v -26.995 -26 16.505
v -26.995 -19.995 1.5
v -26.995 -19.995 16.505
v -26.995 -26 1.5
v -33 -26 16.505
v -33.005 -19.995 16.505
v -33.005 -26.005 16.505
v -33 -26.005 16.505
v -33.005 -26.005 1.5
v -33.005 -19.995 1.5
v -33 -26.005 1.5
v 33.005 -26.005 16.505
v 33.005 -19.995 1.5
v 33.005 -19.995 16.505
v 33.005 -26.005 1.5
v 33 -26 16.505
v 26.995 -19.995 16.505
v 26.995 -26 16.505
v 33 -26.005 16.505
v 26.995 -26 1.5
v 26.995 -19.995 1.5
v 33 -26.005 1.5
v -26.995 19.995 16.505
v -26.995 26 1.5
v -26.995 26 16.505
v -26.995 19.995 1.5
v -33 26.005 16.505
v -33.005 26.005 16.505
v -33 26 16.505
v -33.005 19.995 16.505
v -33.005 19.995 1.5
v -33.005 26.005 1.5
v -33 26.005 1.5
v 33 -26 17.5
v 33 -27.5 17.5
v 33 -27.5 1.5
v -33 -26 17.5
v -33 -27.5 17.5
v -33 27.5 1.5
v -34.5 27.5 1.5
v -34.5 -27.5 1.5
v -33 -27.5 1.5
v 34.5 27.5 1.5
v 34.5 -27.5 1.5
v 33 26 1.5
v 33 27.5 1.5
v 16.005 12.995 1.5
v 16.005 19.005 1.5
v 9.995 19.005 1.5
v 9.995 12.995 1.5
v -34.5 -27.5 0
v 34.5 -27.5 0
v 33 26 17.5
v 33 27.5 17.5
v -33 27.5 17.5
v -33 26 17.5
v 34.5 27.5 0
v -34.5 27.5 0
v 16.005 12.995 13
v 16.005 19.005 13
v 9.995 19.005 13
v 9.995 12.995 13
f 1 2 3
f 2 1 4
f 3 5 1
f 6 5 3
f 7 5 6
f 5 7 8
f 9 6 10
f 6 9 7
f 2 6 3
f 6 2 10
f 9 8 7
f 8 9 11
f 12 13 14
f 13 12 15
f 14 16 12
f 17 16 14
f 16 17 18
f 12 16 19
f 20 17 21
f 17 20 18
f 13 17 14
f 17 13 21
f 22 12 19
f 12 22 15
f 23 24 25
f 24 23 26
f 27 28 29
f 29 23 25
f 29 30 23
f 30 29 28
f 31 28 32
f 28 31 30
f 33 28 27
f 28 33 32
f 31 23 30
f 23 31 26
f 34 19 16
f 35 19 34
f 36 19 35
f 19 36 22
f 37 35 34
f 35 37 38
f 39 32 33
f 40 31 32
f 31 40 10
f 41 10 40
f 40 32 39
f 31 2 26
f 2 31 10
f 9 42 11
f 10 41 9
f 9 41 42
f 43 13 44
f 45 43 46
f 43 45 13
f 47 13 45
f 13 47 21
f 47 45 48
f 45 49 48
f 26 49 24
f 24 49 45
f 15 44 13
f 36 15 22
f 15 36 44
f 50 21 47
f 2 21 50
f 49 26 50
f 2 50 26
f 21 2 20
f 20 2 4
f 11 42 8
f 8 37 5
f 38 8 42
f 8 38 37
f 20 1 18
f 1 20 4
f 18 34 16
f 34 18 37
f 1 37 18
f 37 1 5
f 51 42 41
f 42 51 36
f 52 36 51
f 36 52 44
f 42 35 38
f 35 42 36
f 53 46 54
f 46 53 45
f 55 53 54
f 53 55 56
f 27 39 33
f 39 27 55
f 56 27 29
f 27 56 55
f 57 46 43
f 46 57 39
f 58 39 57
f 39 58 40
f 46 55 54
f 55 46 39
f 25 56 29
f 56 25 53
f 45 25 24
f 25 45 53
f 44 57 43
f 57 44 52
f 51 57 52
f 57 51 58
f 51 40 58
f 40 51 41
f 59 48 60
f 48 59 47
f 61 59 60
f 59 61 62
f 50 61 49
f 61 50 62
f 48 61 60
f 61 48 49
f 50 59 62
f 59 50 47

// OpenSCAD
// Basic encosulre for the bike computer. Specail made
// For a quick n'dirty assembly of a blue-pill STM32 MCU
// with 2 buttons and a 1.3 inch display. Totally non-standard.
// 
// It is made of two parts. Comment out each one to print the other.


eps = 0.01;
wall_width = 1.5;

pcb_w = 66;
pcb_h = 52;
pcb_d = 1.5;

width = pcb_w + 2*wall_width;
height = pcb_h + 2*wall_width;

// Screen related measurements.
scr_w = 36;
scr_h = 20;

scr_to_pcb_h = 7;
scr_offs_x = 0;
scr_offs_y = (pcb_h - scr_h) / 2 - scr_to_pcb_h;

// Buttons.
button_d = 13;
bt_to_pcb_h = 11;

bt_offs_x = 24;
bt_offs_y = pcb_h / 2 - bt_to_pcb_h;

// Support height.
supp_h = 9;
supp_w = 8;

// Height for the backside.
back_d = 15;

// Top part
/*
union() {
translate([0,0, wall_width/2]) 
difference() {
// Base front plate.
translate([0,0,0]) cube([width, height, wall_width], center=true);
// Opening display.
translate([scr_offs_x, scr_offs_y,0]) cube([scr_w,scr_h,wall_width+eps], center = true);
// Button 1 hole.
translate([bt_offs_x, bt_offs_y,0]) cylinder(wall_width+eps, button_d/2, button_d/2, center = true, $fn=32);
// Button 2 hole.
translate([-bt_offs_x, bt_offs_y,0]) cylinder(wall_width+eps, button_d/2, button_d/2, center = true, $fn=32);
}
translate([0,0, supp_h/2+wall_width]) {
// low Support 1
translate([-(pcb_w-supp_w)/2, -(pcb_h-supp_w)/2,0]) cube([supp_w+eps, supp_w+eps, supp_h+eps], center=true);
// low Support 2
translate([(pcb_w-supp_w)/2,-(pcb_h-supp_w)/2,0]) cube([supp_w+eps, supp_w+eps, supp_h+eps], center=true);
}
translate([0,0, supp_h/2+wall_width/2]) {
// top_sidewall
translate([0,(pcb_h+wall_width)/2,0]) cube([width, wall_width, wall_width + supp_h], center=true);
// bottom_sidewall
translate([0,-(pcb_h+wall_width)/2,0]) cube([width, wall_width, wall_width + supp_h], center=true);
}
side_z = wall_width + supp_h + pcb_d + back_d;
translate([0,0, side_z / 2]) {
// left_sidewall
translate([-(pcb_w+wall_width)/2,0,0]) cube([wall_width, height, side_z], center=true);
// right_sidewall
translate([(pcb_w+wall_width)/2,0,0]) cube([wall_width, height, side_z], center=true);
}
}
*/

// Bottom part 
translate([0,0, wall_width/2]) 
union() {
//translate([0,0, wall_width/2]) 

// Base front plate.
translate([0,0,0]) cube([width, height, wall_width], center=true);

// Support ext conn
supp1_h=11.5;
supp1_w=6;
supp1_x=pcb_w/2 - 20;
supp1_y=pcb_h/2 - 10;    
translate([supp1_x, supp1_y, (
    supp1_h + wall_width)/2]) cube([supp1_w+eps, supp1_w+eps, supp1_h], center=true);

supp2_w=6;    
supp2_h=15;    
translate([0,0, supp2_h/2+wall_width/2]) {
// low Support 1
translate([-(pcb_w-supp2_w)/2, -(pcb_h-supp2_w)/2,0]) cube([supp2_w+eps, supp2_w+eps, supp2_h+eps], center=true);
// low Support 2
translate([(pcb_w-supp2_w)/2,-(pcb_h-supp2_w)/2,0]) cube([supp2_w+eps, supp2_w+eps, supp2_h+eps], center=true);
// high Support 1
translate([-(pcb_w-supp2_w)/2,(pcb_h-supp2_w)/2,0]) cube([supp2_w+eps, supp2_w+eps, supp2_h+eps], center=true);
    
}

side_z = 16;
translate([0,0, side_z / 2 + wall_width/2]) {
// up_sidewall
translate([0,-(pcb_h+wall_width)/2,0]) cube([pcb_w, wall_width, side_z], center=true);
// down_sidewall
translate([0,(pcb_h+wall_width)/2,0]) cube([pcb_w, wall_width, side_z], center=true);
}
}
